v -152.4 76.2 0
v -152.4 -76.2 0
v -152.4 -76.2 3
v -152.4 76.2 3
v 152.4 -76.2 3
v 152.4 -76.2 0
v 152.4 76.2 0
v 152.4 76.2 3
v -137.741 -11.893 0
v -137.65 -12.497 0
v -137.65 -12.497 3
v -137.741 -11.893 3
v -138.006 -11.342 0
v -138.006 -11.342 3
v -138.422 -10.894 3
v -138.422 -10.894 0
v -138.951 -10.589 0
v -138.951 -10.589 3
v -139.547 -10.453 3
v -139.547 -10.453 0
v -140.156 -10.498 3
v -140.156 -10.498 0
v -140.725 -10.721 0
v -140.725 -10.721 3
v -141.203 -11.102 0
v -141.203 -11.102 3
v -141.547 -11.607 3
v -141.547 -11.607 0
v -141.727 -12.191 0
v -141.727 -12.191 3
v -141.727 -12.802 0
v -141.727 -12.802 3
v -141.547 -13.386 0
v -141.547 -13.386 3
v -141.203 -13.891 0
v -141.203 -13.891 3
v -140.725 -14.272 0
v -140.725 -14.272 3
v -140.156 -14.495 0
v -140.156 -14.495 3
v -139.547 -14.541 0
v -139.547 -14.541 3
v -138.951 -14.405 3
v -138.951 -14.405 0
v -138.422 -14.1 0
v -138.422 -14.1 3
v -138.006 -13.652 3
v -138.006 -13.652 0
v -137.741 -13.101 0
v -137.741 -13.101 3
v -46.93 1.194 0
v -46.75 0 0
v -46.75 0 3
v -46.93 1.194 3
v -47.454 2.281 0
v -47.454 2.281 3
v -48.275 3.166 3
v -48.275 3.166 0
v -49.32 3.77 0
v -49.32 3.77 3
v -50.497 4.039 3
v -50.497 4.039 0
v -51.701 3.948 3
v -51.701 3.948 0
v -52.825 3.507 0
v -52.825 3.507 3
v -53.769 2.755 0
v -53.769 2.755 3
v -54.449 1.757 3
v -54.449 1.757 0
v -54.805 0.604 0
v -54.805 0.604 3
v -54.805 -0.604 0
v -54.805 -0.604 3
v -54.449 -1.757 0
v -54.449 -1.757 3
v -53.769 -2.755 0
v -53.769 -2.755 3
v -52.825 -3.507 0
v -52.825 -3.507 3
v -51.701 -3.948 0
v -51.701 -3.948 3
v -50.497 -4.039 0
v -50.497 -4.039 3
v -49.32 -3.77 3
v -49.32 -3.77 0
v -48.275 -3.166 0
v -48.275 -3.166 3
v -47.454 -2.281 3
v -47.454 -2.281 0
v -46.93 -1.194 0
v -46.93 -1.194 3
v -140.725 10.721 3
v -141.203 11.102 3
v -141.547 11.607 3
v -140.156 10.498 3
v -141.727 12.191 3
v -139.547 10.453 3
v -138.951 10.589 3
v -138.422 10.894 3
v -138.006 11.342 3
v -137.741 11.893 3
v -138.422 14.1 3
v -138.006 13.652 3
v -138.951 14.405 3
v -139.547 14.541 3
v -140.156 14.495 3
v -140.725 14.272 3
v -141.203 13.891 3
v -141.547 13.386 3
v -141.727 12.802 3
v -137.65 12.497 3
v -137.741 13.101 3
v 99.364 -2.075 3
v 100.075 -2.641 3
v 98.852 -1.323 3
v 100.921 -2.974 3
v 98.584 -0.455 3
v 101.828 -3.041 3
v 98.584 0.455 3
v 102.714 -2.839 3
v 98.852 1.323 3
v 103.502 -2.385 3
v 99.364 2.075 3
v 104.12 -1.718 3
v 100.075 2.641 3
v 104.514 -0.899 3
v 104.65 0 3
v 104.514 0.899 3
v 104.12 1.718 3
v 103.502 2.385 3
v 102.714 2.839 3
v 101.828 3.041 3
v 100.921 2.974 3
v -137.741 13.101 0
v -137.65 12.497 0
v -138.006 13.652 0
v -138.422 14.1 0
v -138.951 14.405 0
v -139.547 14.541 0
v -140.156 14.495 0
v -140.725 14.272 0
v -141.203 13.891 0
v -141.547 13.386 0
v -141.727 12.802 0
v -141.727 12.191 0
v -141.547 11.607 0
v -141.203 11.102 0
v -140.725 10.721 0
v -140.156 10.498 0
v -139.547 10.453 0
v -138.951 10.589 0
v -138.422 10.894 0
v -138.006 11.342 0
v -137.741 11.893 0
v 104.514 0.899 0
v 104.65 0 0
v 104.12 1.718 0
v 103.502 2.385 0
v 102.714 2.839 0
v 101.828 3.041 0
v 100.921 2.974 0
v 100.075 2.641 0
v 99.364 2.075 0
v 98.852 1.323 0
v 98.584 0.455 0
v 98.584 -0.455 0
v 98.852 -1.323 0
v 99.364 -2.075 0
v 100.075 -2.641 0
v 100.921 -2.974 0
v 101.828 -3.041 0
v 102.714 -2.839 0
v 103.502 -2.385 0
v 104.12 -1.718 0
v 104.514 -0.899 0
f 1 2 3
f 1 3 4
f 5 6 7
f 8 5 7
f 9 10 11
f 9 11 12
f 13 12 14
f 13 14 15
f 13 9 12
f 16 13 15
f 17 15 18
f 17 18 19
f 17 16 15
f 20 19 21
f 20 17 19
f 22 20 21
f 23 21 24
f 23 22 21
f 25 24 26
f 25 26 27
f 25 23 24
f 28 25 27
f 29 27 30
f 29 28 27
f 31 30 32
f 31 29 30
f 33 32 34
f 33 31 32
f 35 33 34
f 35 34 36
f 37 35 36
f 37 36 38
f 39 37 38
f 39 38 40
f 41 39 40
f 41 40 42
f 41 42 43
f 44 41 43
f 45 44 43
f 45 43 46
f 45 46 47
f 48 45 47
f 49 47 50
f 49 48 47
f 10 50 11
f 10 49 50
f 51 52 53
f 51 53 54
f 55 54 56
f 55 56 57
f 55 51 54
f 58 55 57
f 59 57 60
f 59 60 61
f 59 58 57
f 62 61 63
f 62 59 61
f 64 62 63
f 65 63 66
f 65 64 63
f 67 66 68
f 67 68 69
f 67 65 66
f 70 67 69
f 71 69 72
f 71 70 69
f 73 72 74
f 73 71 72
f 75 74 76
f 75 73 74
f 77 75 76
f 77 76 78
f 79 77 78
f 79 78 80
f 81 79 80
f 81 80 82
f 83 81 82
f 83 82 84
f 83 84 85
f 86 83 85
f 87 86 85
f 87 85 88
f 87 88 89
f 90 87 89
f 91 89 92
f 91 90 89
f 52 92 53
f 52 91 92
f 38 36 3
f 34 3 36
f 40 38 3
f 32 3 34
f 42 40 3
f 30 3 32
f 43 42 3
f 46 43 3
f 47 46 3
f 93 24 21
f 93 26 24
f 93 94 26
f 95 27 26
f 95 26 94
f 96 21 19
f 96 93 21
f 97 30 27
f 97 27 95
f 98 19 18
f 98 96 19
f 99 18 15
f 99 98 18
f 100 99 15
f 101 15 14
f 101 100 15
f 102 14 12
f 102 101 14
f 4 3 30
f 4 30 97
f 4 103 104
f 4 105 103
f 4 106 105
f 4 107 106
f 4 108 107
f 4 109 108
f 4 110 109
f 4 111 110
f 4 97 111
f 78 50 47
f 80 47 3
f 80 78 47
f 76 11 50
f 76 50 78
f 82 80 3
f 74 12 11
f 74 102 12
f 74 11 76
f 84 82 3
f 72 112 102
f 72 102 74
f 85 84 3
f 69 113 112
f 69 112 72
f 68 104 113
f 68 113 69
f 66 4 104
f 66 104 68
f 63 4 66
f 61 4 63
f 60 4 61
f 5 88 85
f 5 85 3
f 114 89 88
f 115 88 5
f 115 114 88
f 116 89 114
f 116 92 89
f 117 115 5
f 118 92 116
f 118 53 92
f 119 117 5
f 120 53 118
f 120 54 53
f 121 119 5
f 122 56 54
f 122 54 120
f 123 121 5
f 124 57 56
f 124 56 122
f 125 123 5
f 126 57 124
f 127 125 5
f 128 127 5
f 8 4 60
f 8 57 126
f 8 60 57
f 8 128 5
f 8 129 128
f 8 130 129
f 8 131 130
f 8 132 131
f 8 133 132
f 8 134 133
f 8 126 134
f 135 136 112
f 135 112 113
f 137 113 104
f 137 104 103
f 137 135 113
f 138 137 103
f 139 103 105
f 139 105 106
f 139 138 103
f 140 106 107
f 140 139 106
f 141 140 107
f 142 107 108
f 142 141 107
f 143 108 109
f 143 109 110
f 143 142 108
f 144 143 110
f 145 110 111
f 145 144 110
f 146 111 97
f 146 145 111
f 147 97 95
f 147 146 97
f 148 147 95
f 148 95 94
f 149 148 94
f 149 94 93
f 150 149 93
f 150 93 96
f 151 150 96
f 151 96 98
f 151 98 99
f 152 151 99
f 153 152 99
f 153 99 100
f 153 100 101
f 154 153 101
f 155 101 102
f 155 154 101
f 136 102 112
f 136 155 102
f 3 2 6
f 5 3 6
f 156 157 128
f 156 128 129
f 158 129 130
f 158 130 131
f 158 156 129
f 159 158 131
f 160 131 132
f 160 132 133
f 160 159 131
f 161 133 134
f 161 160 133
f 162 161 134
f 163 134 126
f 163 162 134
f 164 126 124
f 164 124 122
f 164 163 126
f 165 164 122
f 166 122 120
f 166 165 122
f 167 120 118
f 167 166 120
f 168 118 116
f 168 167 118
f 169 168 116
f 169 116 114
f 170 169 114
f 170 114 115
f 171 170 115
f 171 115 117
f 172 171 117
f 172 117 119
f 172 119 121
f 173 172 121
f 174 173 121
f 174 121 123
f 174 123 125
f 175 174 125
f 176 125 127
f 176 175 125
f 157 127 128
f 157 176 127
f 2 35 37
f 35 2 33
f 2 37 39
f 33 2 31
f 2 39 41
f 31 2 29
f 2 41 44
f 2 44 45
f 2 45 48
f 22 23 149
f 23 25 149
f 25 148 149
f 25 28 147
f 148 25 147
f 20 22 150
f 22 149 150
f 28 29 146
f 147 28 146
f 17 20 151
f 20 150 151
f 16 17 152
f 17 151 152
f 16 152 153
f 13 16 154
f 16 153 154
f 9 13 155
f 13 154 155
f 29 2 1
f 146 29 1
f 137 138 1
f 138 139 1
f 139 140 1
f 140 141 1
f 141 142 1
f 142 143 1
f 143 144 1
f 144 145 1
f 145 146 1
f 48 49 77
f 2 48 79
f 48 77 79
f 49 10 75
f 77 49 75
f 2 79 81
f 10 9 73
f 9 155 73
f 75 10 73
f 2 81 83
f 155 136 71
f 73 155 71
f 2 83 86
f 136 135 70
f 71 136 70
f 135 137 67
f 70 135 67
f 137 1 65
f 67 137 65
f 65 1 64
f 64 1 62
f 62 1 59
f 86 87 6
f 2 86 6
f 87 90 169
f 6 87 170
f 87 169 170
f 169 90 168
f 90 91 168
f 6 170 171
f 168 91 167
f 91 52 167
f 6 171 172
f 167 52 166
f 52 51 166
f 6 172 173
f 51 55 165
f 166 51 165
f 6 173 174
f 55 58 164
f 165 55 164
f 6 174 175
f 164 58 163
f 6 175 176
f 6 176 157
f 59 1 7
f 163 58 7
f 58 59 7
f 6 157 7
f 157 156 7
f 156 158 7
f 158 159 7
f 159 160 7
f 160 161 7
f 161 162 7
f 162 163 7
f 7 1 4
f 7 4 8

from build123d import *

# Parameters (mm, degrees)
F0_W     = 304.8
F0_H     = 152.4
F0_R     = 2.05
F0_R_2   = 4.05
F0_R_3   = 3.05
F1_DEPTH = 3


with BuildPart() as f1:
    # F0 (on Top) → F1 (new body)
    with BuildSketch(Plane.XY):
        Rectangle(F0_W, F0_H)
        with Locations((-139.7, -12.4968)):
            Circle(F0_R, mode=Mode.SUBTRACT)
        with Locations((-139.7, 12.4968)):
            Circle(F0_R, mode=Mode.SUBTRACT)
        with Locations((-50.8, 0)):
            Circle(F0_R_2, mode=Mode.SUBTRACT)
        with Locations((101.6, 0)):
            Circle(F0_R_3, mode=Mode.SUBTRACT)
    extrude(amount=F1_DEPTH)


solid = f1.part
